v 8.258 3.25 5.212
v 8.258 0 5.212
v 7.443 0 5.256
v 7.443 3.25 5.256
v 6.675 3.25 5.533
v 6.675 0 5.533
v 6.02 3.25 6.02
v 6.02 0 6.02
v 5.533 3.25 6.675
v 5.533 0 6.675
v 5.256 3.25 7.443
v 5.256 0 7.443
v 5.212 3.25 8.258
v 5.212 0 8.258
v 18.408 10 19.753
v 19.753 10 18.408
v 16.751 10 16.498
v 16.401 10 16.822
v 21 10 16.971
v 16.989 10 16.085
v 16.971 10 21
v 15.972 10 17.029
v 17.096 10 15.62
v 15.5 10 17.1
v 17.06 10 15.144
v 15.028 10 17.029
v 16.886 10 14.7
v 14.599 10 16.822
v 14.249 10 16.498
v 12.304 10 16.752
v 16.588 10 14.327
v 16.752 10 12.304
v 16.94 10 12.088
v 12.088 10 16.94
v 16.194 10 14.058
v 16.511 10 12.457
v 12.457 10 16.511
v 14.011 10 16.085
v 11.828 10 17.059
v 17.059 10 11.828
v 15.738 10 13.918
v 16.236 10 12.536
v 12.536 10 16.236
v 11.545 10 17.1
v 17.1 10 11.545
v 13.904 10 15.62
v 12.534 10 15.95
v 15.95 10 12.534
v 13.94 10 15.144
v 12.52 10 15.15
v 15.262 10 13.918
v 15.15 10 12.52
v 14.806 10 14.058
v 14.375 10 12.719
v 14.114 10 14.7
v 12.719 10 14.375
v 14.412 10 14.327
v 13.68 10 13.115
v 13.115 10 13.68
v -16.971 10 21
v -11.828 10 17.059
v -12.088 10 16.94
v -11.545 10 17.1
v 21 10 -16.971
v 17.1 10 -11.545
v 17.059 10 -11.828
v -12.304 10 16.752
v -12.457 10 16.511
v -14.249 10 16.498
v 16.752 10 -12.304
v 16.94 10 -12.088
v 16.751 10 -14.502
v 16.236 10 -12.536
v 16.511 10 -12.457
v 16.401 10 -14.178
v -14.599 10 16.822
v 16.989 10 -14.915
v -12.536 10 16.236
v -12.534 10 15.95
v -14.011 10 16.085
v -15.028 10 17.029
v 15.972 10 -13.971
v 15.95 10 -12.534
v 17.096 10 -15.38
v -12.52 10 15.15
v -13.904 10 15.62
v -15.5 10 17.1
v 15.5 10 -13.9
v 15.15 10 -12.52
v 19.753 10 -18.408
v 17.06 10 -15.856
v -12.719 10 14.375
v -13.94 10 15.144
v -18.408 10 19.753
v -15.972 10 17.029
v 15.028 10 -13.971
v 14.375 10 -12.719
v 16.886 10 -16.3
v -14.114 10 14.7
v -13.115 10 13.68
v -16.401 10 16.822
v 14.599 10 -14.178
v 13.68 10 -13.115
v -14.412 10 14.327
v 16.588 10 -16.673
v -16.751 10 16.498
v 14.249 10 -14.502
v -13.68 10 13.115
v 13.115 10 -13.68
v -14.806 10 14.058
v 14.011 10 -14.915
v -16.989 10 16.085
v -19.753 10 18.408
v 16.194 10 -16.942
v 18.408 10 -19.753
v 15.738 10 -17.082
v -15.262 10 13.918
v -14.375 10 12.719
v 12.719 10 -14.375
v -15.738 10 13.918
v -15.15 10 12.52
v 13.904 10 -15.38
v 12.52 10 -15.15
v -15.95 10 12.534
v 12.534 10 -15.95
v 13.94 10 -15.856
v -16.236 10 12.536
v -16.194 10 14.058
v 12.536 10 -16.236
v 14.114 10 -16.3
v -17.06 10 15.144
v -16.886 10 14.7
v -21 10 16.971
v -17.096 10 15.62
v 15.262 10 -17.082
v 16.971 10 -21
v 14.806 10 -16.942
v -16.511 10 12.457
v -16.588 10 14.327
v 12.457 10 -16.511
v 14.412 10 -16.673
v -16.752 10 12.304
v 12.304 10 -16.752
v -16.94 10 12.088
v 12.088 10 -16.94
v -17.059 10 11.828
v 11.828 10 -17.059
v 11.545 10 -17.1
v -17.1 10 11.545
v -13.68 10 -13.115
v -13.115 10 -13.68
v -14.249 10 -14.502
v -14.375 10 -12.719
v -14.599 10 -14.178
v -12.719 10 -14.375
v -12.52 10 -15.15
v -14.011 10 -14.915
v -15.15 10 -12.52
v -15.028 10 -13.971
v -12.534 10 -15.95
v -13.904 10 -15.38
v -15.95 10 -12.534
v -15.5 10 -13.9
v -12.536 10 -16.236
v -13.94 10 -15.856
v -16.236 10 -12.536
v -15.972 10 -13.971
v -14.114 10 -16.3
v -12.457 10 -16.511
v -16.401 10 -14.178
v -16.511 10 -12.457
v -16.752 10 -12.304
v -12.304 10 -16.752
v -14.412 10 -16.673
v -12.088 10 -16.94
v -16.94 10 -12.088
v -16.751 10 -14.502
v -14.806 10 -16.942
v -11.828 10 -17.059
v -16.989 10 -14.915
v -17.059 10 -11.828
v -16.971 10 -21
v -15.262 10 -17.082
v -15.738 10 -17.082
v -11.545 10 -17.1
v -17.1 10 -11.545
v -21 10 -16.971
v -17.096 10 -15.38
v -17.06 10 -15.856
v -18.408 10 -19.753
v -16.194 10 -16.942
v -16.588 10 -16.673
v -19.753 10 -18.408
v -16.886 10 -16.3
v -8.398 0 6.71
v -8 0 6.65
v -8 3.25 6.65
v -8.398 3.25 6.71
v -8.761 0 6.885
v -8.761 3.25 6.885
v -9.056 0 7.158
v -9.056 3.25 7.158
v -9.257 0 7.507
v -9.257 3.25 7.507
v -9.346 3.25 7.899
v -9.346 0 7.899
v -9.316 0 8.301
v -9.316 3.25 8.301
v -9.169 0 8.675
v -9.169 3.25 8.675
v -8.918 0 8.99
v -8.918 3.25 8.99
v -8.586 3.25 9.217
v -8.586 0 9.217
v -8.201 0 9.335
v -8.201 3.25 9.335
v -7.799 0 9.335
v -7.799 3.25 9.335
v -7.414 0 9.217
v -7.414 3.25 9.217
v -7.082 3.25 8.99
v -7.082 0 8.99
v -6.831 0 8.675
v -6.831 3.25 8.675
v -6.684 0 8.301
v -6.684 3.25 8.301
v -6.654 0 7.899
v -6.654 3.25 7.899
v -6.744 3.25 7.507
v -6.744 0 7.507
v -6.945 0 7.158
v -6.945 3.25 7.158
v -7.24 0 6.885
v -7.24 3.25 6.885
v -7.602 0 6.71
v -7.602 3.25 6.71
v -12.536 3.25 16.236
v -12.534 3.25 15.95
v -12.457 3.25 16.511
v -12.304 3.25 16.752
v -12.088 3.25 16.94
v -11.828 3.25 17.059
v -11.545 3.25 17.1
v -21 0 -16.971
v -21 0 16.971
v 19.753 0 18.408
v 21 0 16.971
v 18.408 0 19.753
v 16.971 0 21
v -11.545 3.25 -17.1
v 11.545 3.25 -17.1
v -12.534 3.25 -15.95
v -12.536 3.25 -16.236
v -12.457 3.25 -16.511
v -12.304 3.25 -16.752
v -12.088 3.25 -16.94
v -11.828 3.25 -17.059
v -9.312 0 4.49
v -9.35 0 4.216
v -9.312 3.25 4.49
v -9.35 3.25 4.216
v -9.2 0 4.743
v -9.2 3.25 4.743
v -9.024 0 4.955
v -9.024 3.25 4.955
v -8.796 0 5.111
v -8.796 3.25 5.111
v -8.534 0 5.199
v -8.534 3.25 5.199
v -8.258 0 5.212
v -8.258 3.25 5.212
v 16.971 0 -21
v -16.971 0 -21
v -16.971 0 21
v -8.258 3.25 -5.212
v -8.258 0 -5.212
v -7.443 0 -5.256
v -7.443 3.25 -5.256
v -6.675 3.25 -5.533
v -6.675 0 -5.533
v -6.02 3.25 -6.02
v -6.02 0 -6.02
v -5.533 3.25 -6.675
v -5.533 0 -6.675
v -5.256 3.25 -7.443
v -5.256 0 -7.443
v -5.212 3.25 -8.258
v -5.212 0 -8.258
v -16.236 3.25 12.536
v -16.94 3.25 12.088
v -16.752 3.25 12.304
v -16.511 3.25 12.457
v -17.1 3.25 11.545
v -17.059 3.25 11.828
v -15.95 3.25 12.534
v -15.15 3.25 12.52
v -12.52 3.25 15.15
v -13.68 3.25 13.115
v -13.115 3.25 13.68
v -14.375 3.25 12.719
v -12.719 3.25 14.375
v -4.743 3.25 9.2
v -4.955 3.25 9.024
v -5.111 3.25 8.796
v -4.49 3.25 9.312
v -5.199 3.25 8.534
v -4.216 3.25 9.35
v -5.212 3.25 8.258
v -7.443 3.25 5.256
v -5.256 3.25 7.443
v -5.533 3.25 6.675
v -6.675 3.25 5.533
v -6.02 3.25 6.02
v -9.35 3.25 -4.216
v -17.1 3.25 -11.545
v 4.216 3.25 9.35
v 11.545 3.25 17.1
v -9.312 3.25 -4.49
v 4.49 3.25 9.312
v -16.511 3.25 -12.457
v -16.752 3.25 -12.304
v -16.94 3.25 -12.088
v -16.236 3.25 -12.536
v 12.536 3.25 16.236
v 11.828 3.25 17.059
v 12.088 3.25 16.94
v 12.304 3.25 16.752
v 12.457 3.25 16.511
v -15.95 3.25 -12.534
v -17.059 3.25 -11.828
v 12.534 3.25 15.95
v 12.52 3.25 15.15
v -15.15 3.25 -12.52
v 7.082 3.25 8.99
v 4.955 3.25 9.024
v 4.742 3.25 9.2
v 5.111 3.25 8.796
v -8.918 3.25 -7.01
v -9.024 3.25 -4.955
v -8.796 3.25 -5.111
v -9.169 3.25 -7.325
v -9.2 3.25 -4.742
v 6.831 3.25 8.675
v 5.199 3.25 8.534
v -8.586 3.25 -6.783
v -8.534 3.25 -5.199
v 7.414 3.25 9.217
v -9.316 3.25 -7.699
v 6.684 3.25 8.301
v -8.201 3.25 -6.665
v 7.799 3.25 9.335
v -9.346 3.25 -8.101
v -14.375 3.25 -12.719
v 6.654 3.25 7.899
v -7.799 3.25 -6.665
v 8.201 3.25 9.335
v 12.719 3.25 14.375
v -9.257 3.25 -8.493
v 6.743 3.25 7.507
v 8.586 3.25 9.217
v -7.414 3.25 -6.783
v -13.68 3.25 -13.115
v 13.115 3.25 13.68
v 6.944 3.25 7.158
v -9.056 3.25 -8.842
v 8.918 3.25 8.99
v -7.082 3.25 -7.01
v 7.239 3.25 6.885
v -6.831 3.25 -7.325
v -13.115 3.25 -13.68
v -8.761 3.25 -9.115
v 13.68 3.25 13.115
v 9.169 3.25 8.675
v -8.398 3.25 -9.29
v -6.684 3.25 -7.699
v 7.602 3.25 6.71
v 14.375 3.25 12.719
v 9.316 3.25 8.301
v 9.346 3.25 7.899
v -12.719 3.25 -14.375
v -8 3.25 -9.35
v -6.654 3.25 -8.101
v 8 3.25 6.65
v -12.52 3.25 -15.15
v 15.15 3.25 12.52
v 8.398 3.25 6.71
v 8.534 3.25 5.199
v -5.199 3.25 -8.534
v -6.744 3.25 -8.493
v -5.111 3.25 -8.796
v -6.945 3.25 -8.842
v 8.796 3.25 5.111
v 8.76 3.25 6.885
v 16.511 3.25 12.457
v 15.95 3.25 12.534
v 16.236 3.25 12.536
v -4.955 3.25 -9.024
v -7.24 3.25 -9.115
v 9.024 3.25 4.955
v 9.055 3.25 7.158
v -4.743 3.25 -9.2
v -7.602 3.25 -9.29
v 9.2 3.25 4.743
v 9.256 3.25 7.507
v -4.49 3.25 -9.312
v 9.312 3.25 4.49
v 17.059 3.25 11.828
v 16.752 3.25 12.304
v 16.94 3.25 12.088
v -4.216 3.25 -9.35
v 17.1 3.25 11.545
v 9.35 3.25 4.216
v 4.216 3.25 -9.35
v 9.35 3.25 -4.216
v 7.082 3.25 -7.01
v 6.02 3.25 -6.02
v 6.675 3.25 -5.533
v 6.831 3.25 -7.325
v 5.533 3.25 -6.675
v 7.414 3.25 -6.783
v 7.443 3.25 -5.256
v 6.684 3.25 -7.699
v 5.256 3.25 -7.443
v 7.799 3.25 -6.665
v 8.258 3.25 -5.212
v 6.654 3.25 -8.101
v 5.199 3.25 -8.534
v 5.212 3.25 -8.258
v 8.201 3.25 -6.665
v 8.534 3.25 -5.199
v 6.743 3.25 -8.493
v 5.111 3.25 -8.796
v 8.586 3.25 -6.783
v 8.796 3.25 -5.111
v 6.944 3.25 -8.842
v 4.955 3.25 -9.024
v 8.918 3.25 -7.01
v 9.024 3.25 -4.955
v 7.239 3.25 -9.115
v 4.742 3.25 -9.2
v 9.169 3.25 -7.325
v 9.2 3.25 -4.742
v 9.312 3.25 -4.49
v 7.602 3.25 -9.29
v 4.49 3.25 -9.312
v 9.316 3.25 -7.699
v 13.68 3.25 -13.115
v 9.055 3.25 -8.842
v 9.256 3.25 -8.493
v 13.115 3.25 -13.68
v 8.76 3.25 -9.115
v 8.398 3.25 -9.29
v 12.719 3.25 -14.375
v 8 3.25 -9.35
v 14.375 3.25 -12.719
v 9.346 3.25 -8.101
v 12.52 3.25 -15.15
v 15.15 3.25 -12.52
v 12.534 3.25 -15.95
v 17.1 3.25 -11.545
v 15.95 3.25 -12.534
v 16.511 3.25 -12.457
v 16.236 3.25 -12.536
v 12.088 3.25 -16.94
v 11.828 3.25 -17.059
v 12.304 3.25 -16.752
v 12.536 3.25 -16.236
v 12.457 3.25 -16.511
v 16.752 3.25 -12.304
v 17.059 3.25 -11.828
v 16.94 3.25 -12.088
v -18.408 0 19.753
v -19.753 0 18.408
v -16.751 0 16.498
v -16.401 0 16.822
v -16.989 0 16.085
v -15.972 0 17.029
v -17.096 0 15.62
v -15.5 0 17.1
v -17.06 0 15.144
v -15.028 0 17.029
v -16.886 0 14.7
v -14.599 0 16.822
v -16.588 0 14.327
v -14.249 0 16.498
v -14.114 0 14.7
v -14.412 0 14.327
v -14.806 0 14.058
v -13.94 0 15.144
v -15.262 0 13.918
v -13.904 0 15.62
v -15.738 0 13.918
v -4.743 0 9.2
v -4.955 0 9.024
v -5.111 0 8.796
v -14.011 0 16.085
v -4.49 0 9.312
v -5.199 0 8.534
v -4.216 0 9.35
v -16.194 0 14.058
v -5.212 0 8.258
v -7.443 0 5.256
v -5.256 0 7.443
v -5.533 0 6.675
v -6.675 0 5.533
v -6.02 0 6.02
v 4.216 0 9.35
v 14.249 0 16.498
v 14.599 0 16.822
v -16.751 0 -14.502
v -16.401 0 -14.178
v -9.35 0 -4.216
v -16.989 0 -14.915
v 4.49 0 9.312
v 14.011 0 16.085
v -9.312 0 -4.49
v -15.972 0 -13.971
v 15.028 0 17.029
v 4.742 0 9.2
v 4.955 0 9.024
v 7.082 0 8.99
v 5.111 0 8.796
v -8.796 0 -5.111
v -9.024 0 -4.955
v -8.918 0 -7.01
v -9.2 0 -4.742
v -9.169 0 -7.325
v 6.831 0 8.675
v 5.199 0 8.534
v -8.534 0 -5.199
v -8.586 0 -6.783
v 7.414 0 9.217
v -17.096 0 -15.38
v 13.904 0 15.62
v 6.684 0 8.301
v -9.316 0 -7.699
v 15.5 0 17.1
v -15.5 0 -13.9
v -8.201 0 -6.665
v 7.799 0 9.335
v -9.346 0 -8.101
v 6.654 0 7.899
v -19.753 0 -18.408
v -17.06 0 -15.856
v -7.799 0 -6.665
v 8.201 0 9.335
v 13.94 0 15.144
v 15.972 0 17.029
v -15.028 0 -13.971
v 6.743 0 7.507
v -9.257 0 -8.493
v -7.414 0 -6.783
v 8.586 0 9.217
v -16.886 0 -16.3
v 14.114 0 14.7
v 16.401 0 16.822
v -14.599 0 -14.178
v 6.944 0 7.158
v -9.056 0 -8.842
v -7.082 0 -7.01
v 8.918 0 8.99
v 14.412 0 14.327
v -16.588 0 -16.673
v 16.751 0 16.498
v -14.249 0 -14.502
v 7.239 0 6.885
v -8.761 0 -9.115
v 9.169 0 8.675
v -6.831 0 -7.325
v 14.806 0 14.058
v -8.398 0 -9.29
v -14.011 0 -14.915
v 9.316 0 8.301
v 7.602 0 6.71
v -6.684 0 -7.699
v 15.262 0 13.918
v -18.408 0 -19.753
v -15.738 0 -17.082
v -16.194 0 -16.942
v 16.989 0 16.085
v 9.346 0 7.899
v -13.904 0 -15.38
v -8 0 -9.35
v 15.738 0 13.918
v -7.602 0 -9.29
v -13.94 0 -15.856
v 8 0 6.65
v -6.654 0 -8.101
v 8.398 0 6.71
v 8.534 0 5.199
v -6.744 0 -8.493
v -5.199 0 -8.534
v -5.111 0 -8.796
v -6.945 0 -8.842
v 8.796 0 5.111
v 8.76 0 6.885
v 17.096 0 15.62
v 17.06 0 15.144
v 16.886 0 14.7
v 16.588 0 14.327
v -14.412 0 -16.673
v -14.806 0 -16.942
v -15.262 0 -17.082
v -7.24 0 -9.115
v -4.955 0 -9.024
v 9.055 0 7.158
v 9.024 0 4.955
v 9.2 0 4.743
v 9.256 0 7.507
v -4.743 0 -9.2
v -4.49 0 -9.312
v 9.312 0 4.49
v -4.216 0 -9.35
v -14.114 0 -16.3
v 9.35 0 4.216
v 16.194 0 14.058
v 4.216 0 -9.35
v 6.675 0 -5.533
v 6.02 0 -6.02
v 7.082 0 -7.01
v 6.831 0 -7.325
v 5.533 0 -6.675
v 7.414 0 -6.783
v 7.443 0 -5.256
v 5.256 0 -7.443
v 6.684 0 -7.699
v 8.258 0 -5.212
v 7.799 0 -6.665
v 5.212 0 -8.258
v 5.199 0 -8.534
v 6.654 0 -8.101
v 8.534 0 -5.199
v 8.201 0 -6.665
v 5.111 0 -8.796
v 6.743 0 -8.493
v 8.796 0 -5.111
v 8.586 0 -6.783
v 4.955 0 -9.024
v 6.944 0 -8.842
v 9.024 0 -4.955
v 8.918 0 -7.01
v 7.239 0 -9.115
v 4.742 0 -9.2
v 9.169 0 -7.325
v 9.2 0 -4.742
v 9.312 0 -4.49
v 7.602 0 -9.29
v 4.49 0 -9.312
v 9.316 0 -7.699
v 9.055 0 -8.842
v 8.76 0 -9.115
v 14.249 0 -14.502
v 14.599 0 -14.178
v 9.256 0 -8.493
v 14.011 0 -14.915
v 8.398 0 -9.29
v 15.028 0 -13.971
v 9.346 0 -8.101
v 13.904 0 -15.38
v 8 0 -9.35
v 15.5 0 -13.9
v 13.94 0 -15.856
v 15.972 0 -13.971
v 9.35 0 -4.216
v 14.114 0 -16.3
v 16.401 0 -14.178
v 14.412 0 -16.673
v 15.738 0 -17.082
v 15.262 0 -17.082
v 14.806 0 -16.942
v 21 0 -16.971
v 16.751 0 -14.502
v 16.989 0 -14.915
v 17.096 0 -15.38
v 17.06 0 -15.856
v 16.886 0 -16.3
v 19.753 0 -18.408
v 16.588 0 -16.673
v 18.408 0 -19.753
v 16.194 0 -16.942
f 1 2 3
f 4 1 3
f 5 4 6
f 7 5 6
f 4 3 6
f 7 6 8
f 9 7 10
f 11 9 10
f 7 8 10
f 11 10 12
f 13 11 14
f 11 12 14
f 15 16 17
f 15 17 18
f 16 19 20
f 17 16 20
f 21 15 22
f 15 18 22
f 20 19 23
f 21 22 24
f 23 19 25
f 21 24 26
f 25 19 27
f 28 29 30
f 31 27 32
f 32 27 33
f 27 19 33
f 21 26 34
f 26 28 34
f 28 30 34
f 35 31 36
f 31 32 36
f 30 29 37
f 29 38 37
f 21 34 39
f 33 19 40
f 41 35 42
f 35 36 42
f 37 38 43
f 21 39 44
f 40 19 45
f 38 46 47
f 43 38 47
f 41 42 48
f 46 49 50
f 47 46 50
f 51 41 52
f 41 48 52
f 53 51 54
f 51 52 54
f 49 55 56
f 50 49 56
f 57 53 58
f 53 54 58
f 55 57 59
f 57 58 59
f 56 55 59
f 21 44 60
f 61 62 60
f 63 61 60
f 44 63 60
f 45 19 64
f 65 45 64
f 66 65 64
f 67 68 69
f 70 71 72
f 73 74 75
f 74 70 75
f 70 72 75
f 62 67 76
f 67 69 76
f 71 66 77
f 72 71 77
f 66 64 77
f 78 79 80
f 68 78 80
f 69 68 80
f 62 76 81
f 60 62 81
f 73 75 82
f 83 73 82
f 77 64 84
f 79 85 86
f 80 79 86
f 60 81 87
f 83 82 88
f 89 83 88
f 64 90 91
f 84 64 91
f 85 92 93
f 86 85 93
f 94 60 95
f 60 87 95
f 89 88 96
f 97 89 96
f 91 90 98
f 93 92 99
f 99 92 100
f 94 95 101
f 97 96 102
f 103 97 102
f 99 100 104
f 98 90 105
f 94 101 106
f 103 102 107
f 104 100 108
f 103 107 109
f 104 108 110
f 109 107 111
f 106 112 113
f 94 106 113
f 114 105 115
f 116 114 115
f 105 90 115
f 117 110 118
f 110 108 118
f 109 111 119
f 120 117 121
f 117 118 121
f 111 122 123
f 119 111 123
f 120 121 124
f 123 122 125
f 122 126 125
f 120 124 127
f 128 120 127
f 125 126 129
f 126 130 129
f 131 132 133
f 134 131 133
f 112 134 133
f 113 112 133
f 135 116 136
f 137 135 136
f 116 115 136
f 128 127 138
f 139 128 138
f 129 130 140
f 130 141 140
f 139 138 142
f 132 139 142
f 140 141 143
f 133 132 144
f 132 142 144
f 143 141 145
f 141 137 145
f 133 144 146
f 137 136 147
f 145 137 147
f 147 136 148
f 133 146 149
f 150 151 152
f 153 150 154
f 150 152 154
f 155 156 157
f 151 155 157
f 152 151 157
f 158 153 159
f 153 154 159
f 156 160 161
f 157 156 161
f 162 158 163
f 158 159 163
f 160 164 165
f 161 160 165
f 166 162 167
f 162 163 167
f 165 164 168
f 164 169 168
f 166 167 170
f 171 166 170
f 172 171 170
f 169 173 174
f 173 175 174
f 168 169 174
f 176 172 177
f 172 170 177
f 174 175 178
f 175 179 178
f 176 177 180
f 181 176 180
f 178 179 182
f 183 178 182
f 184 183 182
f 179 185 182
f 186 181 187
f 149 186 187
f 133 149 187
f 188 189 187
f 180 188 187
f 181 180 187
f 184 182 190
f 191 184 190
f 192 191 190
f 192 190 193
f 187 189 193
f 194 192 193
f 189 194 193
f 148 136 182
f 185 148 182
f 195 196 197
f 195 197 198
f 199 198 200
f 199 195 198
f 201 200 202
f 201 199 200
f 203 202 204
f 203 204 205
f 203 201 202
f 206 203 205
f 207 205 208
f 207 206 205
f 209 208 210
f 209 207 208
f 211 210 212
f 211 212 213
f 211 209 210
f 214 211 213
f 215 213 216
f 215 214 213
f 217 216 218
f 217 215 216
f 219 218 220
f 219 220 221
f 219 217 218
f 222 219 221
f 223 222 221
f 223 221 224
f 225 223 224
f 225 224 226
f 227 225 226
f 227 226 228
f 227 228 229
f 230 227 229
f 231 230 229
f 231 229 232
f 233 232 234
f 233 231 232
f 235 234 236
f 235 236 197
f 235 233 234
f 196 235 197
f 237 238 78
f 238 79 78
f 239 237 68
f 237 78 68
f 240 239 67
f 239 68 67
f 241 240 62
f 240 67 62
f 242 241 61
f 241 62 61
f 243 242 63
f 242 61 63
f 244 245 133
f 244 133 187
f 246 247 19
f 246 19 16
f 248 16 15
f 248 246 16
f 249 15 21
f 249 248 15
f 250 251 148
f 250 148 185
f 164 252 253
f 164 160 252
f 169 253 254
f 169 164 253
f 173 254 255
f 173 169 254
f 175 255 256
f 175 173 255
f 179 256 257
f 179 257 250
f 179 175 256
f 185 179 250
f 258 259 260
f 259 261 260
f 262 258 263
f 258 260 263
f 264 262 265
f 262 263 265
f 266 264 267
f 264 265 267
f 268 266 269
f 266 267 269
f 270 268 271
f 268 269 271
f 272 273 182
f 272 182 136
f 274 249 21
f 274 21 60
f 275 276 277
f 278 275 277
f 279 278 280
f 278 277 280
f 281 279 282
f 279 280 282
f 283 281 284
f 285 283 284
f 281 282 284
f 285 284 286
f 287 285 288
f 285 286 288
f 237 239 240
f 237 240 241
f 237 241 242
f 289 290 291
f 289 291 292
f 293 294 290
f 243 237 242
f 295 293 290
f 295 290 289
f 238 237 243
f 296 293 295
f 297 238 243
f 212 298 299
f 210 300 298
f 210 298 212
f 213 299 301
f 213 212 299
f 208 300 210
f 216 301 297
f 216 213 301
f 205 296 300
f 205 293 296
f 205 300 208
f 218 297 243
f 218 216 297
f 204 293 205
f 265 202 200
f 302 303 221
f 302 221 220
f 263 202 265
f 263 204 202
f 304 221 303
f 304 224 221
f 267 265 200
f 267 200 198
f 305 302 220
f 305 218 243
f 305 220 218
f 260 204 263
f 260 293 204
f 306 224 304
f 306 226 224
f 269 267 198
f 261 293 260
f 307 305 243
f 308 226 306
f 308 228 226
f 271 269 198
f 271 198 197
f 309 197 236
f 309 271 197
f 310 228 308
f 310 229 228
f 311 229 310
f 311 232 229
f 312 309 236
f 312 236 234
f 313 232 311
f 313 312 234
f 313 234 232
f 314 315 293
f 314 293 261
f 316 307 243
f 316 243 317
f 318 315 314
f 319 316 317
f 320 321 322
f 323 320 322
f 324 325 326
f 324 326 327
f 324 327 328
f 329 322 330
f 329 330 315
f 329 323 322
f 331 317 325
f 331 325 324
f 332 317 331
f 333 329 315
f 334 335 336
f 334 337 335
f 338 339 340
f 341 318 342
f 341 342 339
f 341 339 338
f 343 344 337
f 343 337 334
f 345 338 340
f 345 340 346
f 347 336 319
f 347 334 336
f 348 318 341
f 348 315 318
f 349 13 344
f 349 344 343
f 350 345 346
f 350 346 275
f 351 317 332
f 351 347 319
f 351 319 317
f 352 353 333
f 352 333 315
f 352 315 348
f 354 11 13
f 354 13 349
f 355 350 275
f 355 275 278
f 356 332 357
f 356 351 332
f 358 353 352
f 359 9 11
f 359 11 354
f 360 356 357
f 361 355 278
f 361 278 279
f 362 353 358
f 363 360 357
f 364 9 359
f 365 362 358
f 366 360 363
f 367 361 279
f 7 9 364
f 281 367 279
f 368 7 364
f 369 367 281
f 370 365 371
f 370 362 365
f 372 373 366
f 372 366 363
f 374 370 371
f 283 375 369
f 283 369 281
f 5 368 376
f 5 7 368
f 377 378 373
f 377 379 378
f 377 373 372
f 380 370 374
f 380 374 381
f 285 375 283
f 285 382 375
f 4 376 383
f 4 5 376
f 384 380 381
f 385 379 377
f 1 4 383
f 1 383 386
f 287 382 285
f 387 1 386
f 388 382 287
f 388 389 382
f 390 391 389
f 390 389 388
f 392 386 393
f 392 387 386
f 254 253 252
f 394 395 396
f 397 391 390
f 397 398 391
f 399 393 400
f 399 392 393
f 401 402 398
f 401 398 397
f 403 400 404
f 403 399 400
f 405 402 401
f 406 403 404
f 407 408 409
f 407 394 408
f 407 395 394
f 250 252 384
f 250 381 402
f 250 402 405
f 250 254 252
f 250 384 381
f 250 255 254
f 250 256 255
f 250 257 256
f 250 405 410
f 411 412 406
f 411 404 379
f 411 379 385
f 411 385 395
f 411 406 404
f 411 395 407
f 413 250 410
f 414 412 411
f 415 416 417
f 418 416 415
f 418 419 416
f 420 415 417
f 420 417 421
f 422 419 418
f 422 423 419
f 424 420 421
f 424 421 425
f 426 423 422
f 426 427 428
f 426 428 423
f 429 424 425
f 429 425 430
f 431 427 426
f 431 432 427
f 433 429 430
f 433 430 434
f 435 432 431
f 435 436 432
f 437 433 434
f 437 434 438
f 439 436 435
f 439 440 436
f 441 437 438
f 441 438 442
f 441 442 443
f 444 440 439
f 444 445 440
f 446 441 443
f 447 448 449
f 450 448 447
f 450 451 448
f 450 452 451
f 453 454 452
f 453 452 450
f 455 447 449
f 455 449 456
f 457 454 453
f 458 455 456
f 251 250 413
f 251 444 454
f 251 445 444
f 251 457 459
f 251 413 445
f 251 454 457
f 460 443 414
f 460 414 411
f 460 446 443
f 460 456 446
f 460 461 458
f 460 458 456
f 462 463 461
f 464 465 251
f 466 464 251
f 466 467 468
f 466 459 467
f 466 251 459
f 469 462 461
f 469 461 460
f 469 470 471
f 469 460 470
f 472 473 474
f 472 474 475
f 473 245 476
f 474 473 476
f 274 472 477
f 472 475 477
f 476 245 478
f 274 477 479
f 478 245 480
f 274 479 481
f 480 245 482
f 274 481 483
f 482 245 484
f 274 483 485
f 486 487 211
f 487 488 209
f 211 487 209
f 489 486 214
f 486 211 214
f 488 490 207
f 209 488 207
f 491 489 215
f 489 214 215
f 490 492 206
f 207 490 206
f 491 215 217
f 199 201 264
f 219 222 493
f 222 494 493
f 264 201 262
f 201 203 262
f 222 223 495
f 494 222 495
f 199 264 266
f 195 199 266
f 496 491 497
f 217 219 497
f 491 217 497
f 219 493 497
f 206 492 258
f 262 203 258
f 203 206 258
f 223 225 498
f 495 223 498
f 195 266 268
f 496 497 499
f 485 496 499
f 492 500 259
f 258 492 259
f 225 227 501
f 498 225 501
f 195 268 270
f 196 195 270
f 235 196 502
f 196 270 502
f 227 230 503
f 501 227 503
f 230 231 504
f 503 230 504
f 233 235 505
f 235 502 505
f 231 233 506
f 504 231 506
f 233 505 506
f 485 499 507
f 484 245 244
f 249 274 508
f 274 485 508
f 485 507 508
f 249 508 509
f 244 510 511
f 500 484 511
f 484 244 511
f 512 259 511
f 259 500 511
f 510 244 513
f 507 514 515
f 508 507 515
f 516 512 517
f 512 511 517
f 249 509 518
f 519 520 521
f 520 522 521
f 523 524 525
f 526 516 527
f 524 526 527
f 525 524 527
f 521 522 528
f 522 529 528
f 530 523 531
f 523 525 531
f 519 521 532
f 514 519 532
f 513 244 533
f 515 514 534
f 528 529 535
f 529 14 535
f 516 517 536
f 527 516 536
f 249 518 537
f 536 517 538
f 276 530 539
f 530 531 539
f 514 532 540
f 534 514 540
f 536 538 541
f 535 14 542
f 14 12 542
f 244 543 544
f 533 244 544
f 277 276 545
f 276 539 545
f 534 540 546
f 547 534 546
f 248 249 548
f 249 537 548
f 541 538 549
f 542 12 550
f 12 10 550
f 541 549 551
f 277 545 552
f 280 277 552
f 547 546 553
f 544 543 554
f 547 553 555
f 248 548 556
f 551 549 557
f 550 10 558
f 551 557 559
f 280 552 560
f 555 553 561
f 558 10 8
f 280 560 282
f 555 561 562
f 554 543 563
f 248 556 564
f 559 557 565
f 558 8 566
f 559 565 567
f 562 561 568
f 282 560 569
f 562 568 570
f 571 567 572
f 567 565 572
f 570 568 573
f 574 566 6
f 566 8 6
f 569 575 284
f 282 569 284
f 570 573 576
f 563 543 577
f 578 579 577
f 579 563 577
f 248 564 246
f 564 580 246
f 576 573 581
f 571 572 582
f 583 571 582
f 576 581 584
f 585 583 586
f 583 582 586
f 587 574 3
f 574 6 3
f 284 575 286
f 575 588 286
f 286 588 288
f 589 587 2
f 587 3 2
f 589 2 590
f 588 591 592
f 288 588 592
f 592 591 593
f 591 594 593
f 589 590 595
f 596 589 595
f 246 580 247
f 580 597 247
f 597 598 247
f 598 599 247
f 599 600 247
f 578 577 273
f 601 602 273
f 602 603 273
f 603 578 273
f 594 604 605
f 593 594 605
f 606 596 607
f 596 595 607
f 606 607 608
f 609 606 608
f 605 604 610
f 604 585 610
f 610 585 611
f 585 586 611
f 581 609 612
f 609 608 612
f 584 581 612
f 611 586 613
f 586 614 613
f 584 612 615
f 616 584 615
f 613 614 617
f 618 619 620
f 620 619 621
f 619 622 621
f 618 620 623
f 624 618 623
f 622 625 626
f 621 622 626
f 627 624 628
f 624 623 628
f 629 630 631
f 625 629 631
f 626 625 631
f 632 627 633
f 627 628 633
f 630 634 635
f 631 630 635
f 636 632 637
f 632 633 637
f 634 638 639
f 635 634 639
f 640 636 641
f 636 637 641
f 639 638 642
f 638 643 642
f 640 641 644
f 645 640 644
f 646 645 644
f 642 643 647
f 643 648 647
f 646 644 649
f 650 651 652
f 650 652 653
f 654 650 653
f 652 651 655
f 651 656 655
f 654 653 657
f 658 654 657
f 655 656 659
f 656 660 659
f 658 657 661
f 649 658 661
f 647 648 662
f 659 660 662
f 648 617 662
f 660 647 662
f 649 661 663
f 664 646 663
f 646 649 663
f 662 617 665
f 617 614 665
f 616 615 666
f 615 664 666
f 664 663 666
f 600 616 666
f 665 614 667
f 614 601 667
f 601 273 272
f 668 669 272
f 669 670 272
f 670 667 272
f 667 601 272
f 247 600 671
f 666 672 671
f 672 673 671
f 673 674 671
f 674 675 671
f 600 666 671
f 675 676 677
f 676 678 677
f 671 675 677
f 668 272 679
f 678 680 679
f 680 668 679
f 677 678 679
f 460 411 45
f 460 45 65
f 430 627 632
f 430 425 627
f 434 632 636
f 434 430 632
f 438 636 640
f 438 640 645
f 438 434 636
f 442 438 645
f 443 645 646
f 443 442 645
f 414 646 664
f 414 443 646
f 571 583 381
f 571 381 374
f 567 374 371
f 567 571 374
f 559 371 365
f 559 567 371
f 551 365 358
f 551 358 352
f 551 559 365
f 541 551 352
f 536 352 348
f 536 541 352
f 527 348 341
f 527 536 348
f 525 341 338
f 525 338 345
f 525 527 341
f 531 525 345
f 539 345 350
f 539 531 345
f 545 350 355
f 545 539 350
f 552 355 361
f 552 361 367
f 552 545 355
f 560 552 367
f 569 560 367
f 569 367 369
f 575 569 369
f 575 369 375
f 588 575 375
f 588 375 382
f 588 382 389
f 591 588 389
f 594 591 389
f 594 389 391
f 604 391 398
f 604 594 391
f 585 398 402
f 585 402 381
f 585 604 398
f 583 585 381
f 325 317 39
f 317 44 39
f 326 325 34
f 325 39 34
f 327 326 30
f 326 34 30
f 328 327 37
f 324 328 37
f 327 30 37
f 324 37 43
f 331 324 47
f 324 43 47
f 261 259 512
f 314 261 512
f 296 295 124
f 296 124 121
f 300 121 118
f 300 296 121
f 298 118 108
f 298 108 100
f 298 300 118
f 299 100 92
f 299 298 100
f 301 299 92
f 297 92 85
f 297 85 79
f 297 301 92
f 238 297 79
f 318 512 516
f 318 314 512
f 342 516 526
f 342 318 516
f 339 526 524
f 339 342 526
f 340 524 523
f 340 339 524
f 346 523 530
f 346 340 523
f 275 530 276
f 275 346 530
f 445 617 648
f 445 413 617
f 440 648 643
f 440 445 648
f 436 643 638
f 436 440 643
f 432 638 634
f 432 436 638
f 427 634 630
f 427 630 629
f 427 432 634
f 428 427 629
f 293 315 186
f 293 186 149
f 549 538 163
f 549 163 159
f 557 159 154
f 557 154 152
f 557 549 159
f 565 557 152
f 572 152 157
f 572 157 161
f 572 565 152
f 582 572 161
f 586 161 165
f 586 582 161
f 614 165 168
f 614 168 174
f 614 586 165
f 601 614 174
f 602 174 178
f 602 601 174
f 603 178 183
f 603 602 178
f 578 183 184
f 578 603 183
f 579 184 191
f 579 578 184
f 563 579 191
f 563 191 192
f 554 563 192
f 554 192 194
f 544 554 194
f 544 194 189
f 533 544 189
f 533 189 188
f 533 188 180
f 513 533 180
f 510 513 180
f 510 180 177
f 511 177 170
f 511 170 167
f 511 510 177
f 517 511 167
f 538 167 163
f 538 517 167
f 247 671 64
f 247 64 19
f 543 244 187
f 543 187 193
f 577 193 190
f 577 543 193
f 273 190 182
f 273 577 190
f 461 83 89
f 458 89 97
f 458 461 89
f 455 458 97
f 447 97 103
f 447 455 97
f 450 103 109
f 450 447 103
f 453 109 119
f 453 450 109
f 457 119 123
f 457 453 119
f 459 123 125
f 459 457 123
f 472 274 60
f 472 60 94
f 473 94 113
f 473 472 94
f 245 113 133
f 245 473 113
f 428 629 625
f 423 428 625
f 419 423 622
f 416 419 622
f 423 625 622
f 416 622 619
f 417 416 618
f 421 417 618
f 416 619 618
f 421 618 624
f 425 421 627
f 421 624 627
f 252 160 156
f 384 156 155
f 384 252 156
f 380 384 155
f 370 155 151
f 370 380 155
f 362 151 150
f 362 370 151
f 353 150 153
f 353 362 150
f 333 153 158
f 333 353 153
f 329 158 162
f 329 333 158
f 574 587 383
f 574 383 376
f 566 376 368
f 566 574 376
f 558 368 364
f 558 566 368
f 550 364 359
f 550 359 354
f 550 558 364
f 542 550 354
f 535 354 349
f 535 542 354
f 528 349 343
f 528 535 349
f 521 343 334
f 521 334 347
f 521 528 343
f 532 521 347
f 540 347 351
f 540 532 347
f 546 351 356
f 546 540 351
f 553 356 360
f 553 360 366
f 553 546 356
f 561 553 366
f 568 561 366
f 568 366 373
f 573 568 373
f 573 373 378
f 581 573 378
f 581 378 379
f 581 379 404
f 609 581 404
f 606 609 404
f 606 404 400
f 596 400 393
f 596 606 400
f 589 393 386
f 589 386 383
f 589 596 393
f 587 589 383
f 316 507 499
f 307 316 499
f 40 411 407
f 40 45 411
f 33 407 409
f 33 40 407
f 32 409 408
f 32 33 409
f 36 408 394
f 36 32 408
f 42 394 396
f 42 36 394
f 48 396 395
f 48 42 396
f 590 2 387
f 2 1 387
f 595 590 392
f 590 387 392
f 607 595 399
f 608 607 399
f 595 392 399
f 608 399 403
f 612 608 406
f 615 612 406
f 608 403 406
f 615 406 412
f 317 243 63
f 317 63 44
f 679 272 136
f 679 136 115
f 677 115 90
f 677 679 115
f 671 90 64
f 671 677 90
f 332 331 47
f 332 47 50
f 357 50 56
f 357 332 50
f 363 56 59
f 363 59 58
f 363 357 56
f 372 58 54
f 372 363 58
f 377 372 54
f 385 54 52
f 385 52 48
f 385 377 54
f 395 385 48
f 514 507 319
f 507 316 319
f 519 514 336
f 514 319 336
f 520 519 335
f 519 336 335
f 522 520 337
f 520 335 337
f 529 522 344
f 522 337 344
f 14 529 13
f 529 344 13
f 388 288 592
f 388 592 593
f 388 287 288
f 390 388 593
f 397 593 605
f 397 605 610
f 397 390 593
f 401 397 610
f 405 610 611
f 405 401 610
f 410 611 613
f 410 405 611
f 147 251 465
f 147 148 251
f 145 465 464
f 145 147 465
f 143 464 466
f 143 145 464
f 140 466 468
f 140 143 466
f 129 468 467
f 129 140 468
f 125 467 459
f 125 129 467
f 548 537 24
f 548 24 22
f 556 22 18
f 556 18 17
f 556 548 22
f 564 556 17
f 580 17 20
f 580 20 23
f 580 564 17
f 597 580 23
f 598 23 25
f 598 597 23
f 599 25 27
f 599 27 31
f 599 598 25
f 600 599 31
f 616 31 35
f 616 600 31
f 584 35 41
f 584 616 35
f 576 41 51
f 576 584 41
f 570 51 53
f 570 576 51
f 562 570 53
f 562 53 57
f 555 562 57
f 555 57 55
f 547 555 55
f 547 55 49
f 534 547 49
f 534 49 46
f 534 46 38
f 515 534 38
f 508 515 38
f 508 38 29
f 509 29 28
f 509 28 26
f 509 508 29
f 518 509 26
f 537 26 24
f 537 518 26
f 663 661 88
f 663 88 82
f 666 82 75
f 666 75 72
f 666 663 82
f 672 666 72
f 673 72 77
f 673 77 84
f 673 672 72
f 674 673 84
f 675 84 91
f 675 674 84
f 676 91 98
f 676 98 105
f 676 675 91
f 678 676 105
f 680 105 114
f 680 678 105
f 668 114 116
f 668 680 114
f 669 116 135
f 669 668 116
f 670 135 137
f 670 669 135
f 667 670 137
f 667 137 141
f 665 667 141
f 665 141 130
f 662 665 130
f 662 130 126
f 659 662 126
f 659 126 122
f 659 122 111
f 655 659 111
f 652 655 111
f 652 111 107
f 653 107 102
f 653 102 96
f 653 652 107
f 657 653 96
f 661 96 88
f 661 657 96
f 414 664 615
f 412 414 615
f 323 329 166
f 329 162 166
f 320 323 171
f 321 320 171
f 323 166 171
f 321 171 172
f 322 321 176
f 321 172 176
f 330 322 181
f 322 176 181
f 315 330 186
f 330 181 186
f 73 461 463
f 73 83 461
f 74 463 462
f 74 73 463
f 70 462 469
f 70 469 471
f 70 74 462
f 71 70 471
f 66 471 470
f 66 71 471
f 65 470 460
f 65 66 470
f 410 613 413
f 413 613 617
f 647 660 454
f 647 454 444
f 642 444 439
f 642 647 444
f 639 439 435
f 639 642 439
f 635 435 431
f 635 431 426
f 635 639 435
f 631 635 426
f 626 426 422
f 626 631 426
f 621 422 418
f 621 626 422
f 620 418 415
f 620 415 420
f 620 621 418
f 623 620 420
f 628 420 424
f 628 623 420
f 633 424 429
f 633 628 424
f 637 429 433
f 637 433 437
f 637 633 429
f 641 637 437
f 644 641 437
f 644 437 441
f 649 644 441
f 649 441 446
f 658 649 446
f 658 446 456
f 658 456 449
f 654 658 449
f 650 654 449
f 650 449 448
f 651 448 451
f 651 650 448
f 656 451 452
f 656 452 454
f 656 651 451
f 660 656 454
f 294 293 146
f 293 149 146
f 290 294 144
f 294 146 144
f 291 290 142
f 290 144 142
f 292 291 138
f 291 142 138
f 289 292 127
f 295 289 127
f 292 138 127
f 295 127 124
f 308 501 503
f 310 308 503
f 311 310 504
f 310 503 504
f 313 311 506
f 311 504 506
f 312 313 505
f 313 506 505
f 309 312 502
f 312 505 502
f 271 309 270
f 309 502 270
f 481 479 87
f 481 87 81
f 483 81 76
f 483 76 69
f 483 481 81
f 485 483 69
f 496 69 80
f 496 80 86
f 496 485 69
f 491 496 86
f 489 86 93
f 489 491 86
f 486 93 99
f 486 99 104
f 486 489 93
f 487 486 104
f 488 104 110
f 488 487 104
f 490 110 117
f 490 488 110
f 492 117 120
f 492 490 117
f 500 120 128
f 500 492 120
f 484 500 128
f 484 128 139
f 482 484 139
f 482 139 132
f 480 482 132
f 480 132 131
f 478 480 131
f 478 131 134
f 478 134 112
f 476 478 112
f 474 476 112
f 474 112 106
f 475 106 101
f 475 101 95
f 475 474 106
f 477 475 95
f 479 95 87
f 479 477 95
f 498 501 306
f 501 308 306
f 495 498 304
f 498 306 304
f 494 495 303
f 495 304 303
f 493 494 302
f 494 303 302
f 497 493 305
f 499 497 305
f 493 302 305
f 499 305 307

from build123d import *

# Parameters (mm, degrees)
SKETCH1_R           = 1.6
BOSS_EXTRUDE1_DEPTH = 10
SKETCH1_3_R         = 1.35
BOSS_EXTRUDE2_DEPTH = 3.25
FILLET1_R           = 1


with BuildPart() as part:
    # Sketch1 → Boss-Extrude1 (new body)
    with BuildSketch(Plane(origin=(0, 0, 0), x_dir=(1, 0, 0), z_dir=(0, 1, 0))):
        with BuildLine():
            Line((16.971, 21), (-16.971, 21))
            ThreePointArc((-16.971, 21), (-19.092078518, 19.092078518), (-21, 16.971))
            Line((-21, 16.971), (-21, -16.971))
            ThreePointArc((-21, -16.971), (-19.092078518, -19.092078518), (-16.971, -21))
            Line((-16.971, -21), (16.971, -21))
            ThreePointArc((16.971, -21), (19.092078518, -19.092078518), (21, -16.971))
            Line((21, -16.971), (21, 16.971))
            ThreePointArc((21, 16.971), (19.092078518, 19.092078518), (16.971, 21))
        make_face()
        with Locations((-15.5, -15.5)):
            Circle(SKETCH1_R, mode=Mode.SUBTRACT)
        with Locations((15.5, -15.5)):
            Circle(SKETCH1_R, mode=Mode.SUBTRACT)
        with Locations((-15.5, 15.5)):
            Circle(SKETCH1_R, mode=Mode.SUBTRACT)
        with BuildLine():
            Line((-17.1, -12.962284492), (-17.1, 12.962284492))
            ThreePointArc((-17.1, 12.962284492), (-13.378679656, 13.378679656), (-12.962284492, 17.1))
            Line((-12.962284492, 17.1), (12.962284492, 17.1))
            ThreePointArc((12.962284492, 17.1), (13.378679656, 13.378679656), (17.1, 12.962284492))
            Line((17.1, 12.962284492), (17.1, -12.962284492))
            ThreePointArc((17.1, -12.962284492), (13.378679656, -13.378679656), (12.962284492, -17.1))
            Line((12.962284492, -17.1), (-12.962284492, -17.1))
            ThreePointArc((-12.962284492, -17.1), (-13.378679656, -13.378679656), (-17.1, -12.962284492))
        make_face(mode=Mode.SUBTRACT)
        with Locations((15.5, 15.5)):
            Circle(SKETCH1_R, mode=Mode.SUBTRACT)
    extrude(amount=BOSS_EXTRUDE1_DEPTH)

    # Sketch1<3> → Boss-Extrude2 (add)
    with BuildSketch(Plane(origin=(0, 0, 0), x_dir=(1, 0, 0), z_dir=(0, 1, 0))):
        with BuildLine():
            ThreePointArc((-12.962284492, 17.1), (-13.378679656, 13.378679656), (-17.1, 12.962284492))
            Line((-17.1, 12.962284492), (-17.1, -12.962284492))
            ThreePointArc((-17.1, -12.962284492), (-13.378679656, -13.378679656), (-12.962284492, -17.1))
            Line((-12.962284492, -17.1), (12.962284492, -17.1))
            ThreePointArc((12.962284492, -17.1), (13.378679656, -13.378679656), (17.1, -12.962284492))
            Line((17.1, -12.962284492), (17.1, 12.962284492))
            ThreePointArc((17.1, 12.962284492), (13.378679656, 13.378679656), (12.962284492, 17.1))
            Line((12.962284492, 17.1), (-12.962284492, 17.1))
        make_face()
        with Locations((-8.000195426, -8.000195426)):
            Circle(SKETCH1_3_R, mode=Mode.SUBTRACT)
        with BuildLine():
            ThreePointArc((-9.350195426, 5.546745259), (-6.020296439, 6.019905586), (-5.547136112, 9.349804574))
            Line((-5.547136112, 9.349804574), (5.546745259, 9.349804574))
            ThreePointArc((5.546745259, 9.349804574), (6.019905586, 6.019905586), (9.349804574, 5.546745259))
            Line((9.349804574, 5.546745259), (9.349804574, -5.547136112))
            ThreePointArc((9.349804574, -5.547136112), (6.019905586, -6.020296439), (5.546745259, -9.350195426))
            Line((5.546745259, -9.350195426), (-5.547136112, -9.350195426))
            ThreePointArc((-5.547136112, -9.350195426), (-6.020296439, -6.020296439), (-9.350195426, -5.547136112))
            Line((-9.350195426, -5.547136112), (-9.350195426, 5.546745259))
        make_face(mode=Mode.SUBTRACT)
        with Locations((7.999804574, -8.000195426)):
            Circle(SKETCH1_3_R, mode=Mode.SUBTRACT)
        with Locations((-8.000195426, 7.999804574)):
            Circle(SKETCH1_3_R, mode=Mode.SUBTRACT)
        with Locations((7.999804574, 7.999804574)):
            Circle(SKETCH1_3_R, mode=Mode.SUBTRACT)
    extrude(amount=BOSS_EXTRUDE2_DEPTH)

    # Fillet1
    fillet1_edges = [part.edges().sort_by_distance(p)[0] for p in [
        (12.962284492, 6.625, 17.1),
        (17.1, 6.625, -12.962284492),
        (12.962284492, 6.625, -17.1),
        (-12.962284492, 6.625, -17.1),
        (-17.1, 6.625, -12.962284492),
        (-17.1, 6.625, 12.962284492),
        (-12.962284492, 6.625, 17.1),
        (-5.547136112, 1.625, 9.350195426),
        (-9.350195426, 1.625, 5.547136112),
        (5.546745259, 1.625, 9.350195426),
        (9.349804574, 1.625, 5.547136112),
        (9.349804574, 1.625, -5.546745259),
        (5.546745259, 1.625, -9.349804574),
        (-5.547136112, 1.625, -9.349804574),
        (-9.350195426, 1.625, -5.546745259),
        (17.1, 6.625, 12.962284492),
    ]]
    fillet(fillet1_edges, radius=FILLET1_R)


solid = part.part
